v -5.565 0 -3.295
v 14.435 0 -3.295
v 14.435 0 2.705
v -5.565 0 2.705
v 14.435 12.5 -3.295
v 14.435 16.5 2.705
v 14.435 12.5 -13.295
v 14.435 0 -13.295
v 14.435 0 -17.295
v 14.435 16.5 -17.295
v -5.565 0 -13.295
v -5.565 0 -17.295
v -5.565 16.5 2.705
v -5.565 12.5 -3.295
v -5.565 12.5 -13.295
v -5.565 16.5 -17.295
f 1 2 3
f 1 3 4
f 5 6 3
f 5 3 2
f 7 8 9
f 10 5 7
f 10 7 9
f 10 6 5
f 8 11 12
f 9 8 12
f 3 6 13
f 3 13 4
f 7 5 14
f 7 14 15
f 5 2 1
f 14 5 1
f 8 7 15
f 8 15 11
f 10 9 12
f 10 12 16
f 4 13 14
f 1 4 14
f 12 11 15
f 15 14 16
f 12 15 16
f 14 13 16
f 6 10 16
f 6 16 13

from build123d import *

# Parameters (mm, degrees)
BOSS_EXTRUDE1_DEPTH = 12.5
BOSS_EXTRUDE4_DEPTH = 20


with BuildPart() as part:
    # Sketch1 → Boss-Extrude1 (new body)
    with BuildSketch(Plane(origin=(0, 0, 0), x_dir=(1, 0, 0), z_dir=(0, 1, 0))):
        Polygon((-2.564516129, 3.29516129), (14.435483871, 3.29516129), (14.435483871, -2.70483871), (-5.564516129, -2.70483871), (-5.564516129, 3.29516129), (-4.064516129, 3.29516129), align=None)
    extrude(amount=BOSS_EXTRUDE1_DEPTH)

    # Sketch2 → Boss-Extrude4 (add)
    with BuildSketch(Plane(origin=(14.435483871, 0, 0), x_dir=(0, 0, -1), z_dir=(1, 0, 0))):
        Polygon((-2.70483871, 12.5), (13.29516129, 12.5), (13.29516129, 0), (17.29516129, 0), (17.29516129, 12.5), (17.29516129, 16.5), (-2.70483871, 16.5), align=None)
    extrude(amount=-BOSS_EXTRUDE4_DEPTH)


solid = part.part
